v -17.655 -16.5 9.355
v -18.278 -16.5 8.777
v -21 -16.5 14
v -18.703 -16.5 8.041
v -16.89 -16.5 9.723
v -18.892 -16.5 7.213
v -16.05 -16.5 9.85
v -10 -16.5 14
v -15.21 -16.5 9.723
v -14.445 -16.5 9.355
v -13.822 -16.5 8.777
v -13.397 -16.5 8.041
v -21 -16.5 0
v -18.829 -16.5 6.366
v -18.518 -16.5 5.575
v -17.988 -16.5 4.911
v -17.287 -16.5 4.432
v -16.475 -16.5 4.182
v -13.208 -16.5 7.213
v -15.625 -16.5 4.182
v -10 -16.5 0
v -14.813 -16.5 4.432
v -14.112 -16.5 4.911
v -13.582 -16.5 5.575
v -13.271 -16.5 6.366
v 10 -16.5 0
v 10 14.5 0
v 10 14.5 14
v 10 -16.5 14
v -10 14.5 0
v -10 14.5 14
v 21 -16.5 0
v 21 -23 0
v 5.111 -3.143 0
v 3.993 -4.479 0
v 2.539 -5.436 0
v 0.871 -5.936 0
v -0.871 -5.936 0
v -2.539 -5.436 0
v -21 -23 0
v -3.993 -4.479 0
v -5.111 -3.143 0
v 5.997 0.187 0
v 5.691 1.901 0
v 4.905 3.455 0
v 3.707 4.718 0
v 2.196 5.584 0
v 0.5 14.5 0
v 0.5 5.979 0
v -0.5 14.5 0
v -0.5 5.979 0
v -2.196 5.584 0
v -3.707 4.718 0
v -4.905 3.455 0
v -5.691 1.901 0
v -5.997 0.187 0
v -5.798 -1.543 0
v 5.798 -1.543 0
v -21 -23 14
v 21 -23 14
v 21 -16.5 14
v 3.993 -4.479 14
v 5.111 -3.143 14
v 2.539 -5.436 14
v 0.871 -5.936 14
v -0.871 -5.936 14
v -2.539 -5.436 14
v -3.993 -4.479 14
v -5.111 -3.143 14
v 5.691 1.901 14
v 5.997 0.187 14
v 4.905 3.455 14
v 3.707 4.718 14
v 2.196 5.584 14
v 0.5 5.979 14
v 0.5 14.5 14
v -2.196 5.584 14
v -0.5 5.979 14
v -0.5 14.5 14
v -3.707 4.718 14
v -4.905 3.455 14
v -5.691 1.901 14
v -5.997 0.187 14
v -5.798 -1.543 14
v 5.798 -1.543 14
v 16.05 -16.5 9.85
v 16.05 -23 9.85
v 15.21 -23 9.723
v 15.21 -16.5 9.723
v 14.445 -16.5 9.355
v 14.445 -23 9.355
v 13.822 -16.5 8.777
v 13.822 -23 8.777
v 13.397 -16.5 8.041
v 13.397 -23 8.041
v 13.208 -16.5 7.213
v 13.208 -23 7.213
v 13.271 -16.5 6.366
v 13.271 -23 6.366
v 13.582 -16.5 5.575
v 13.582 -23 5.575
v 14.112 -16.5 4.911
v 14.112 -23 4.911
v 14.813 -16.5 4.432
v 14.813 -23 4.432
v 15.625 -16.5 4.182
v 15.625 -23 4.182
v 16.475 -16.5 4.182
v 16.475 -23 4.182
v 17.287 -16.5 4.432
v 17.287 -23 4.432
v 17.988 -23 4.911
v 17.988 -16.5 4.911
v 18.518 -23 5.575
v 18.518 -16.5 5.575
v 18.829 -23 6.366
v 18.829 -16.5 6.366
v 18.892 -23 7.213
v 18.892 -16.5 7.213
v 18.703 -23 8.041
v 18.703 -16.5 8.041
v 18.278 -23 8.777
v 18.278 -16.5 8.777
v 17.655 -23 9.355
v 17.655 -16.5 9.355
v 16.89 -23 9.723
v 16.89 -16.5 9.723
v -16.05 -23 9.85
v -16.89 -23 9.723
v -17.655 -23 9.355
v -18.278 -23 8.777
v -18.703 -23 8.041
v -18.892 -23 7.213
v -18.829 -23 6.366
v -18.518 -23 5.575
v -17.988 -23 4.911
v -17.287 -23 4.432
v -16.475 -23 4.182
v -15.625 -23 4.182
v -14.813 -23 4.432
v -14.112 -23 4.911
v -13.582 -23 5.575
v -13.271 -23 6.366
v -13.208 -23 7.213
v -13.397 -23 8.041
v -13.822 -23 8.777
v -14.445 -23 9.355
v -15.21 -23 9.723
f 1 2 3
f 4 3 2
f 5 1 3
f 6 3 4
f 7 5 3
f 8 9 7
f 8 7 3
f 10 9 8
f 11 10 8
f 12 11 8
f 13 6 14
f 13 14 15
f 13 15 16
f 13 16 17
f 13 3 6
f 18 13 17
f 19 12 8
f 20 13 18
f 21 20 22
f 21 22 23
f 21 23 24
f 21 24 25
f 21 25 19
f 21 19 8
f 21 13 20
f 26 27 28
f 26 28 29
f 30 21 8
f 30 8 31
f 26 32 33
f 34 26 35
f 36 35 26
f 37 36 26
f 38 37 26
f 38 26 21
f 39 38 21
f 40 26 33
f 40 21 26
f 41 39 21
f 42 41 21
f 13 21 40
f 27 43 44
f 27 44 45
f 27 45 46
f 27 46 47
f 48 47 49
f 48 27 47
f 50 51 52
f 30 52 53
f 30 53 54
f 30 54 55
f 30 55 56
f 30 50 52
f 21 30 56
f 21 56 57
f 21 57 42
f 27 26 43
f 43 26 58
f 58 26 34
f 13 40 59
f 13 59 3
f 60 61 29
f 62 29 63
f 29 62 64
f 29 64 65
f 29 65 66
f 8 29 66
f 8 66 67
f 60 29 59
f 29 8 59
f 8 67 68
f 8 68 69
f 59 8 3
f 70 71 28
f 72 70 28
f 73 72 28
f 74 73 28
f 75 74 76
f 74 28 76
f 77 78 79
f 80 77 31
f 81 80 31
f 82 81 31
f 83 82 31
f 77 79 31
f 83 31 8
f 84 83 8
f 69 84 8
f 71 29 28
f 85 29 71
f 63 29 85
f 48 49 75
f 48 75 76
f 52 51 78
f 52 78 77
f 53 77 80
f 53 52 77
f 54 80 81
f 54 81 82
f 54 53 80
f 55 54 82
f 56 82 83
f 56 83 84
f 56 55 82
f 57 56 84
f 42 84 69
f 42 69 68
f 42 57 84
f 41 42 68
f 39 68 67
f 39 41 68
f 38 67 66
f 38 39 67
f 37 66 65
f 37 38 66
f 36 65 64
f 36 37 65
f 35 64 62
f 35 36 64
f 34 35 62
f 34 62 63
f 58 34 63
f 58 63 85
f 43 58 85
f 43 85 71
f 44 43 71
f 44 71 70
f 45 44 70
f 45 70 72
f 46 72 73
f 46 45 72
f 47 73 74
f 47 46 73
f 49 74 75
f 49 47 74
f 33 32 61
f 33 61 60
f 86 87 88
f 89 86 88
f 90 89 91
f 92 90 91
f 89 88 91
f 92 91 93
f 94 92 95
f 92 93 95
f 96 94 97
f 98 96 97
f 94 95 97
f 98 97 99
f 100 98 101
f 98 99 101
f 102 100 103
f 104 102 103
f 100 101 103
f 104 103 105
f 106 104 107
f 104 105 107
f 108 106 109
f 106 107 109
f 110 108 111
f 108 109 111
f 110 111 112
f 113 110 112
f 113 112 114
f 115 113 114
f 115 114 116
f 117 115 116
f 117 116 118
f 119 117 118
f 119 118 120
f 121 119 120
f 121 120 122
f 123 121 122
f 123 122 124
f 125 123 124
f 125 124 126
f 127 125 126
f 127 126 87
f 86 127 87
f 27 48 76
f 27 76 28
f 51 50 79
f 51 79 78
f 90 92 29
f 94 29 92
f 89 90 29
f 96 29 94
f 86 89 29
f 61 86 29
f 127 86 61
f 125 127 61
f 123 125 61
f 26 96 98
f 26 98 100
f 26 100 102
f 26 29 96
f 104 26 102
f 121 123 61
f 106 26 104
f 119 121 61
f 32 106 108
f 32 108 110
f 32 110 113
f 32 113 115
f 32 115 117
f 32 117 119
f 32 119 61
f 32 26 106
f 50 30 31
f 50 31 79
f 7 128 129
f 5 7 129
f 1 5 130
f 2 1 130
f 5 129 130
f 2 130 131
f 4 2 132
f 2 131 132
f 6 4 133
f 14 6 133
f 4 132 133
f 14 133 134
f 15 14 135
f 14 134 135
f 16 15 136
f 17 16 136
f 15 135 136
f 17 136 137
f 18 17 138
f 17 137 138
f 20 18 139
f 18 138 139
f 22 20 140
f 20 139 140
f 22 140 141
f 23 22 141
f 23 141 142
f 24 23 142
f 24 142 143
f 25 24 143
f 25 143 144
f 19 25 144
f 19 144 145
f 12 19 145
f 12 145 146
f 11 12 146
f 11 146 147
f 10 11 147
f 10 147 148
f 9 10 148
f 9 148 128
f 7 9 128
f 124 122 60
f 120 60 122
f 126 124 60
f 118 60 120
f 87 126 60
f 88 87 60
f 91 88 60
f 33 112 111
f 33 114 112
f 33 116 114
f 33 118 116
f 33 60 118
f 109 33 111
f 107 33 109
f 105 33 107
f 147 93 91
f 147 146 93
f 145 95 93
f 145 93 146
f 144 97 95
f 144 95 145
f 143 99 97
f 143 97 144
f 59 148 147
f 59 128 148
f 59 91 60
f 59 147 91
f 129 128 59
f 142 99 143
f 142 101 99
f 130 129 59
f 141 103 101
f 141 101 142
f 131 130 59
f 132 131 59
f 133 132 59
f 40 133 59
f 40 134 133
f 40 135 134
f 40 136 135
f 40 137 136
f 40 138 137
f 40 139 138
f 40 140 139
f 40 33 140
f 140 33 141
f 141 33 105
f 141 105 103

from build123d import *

# Parameters (mm, degrees)
Y_KSEKLIK_EKSTR_ZYON2_DEPTH       = 14
KES_EKSTR_ZYON1_REACH             = 47.202
IZIM2_R                           = 2.85
KES_EKSTR_ZYON1_DIRECTION_2_DEPTH = 46.202322949


with BuildPart() as part:
    # Çizim1 → Yükseklik-Ekstrüzyon2 (new body)
    with BuildSketch(Plane.XY):
        with BuildLine():
            Line((21, -23), (-21, -23))
            Line((-21, -23), (-21, -16.5))
            Line((-21, -16.5), (-10, -16.5))
            Line((-10, -16.5), (-10, 14.5))
            Line((-10, 14.5), (-0.5, 14.5))
            Line((-0.5, 14.5), (-0.5, 5.979130372))
            ThreePointArc((-0.5, 5.979130372), (0, -6), (0.5, 5.979130372))
            Line((0.5, 5.979130372), (0.5, 14.5))
            Line((0.5, 14.5), (10, 14.5))
            Line((10, 14.5), (10, -16.5))
            Line((10, -16.5), (21, -16.5))
            Line((21, -16.5), (21, -23))
        make_face()
    extrude(amount=Y_KSEKLIK_EKSTR_ZYON2_DEPTH)

    # Çizim2 → Kes-Ekstrüzyon1 (cut, up to next)
    with BuildSketch(Plane.XZ.offset(23), mode=Mode.PRIVATE) as kes_ekstr_zyon1_sk1:
        with Locations(Location((-16.05, 7, 0), (0, 0, 90))):
            Circle(IZIM2_R)
    kes_ekstr_zyon1_tool1 = extrude(kes_ekstr_zyon1_sk1.sketch, amount=-KES_EKSTR_ZYON1_REACH, mode=Mode.PRIVATE) & part.part
    # Çizim2 → Kes-Ekstrüzyon1 (cut, up to next)
    with BuildSketch(Plane.XZ.offset(23), mode=Mode.PRIVATE) as kes_ekstr_zyon1_sk2:
        with Locations(Location((16.05, 7, 0), (0, 0, 90))):
            Circle(IZIM2_R)
    kes_ekstr_zyon1_tool2 = extrude(kes_ekstr_zyon1_sk2.sketch, amount=-KES_EKSTR_ZYON1_REACH, mode=Mode.PRIVATE) & part.part
    add(kes_ekstr_zyon1_tool1.solids().sort_by_distance((-16.05, -23, 7))[0], mode=Mode.SUBTRACT)
    add(kes_ekstr_zyon1_tool2.solids().sort_by_distance((16.05, -23, 7))[0], mode=Mode.SUBTRACT)

    # Çizim2 → Kes-Ekstrüzyon1 direction 2 (cut)
    with BuildSketch(Plane.XZ.offset(23)):
        with Locations(Location((-16.05, 7, 0), (0, 0, 90))):
            Circle(IZIM2_R)
        with Locations(Location((16.05, 7, 0), (0, 0, 90))):
            Circle(IZIM2_R)
    extrude(amount=KES_EKSTR_ZYON1_DIRECTION_2_DEPTH, mode=Mode.SUBTRACT)


solid = part.part
